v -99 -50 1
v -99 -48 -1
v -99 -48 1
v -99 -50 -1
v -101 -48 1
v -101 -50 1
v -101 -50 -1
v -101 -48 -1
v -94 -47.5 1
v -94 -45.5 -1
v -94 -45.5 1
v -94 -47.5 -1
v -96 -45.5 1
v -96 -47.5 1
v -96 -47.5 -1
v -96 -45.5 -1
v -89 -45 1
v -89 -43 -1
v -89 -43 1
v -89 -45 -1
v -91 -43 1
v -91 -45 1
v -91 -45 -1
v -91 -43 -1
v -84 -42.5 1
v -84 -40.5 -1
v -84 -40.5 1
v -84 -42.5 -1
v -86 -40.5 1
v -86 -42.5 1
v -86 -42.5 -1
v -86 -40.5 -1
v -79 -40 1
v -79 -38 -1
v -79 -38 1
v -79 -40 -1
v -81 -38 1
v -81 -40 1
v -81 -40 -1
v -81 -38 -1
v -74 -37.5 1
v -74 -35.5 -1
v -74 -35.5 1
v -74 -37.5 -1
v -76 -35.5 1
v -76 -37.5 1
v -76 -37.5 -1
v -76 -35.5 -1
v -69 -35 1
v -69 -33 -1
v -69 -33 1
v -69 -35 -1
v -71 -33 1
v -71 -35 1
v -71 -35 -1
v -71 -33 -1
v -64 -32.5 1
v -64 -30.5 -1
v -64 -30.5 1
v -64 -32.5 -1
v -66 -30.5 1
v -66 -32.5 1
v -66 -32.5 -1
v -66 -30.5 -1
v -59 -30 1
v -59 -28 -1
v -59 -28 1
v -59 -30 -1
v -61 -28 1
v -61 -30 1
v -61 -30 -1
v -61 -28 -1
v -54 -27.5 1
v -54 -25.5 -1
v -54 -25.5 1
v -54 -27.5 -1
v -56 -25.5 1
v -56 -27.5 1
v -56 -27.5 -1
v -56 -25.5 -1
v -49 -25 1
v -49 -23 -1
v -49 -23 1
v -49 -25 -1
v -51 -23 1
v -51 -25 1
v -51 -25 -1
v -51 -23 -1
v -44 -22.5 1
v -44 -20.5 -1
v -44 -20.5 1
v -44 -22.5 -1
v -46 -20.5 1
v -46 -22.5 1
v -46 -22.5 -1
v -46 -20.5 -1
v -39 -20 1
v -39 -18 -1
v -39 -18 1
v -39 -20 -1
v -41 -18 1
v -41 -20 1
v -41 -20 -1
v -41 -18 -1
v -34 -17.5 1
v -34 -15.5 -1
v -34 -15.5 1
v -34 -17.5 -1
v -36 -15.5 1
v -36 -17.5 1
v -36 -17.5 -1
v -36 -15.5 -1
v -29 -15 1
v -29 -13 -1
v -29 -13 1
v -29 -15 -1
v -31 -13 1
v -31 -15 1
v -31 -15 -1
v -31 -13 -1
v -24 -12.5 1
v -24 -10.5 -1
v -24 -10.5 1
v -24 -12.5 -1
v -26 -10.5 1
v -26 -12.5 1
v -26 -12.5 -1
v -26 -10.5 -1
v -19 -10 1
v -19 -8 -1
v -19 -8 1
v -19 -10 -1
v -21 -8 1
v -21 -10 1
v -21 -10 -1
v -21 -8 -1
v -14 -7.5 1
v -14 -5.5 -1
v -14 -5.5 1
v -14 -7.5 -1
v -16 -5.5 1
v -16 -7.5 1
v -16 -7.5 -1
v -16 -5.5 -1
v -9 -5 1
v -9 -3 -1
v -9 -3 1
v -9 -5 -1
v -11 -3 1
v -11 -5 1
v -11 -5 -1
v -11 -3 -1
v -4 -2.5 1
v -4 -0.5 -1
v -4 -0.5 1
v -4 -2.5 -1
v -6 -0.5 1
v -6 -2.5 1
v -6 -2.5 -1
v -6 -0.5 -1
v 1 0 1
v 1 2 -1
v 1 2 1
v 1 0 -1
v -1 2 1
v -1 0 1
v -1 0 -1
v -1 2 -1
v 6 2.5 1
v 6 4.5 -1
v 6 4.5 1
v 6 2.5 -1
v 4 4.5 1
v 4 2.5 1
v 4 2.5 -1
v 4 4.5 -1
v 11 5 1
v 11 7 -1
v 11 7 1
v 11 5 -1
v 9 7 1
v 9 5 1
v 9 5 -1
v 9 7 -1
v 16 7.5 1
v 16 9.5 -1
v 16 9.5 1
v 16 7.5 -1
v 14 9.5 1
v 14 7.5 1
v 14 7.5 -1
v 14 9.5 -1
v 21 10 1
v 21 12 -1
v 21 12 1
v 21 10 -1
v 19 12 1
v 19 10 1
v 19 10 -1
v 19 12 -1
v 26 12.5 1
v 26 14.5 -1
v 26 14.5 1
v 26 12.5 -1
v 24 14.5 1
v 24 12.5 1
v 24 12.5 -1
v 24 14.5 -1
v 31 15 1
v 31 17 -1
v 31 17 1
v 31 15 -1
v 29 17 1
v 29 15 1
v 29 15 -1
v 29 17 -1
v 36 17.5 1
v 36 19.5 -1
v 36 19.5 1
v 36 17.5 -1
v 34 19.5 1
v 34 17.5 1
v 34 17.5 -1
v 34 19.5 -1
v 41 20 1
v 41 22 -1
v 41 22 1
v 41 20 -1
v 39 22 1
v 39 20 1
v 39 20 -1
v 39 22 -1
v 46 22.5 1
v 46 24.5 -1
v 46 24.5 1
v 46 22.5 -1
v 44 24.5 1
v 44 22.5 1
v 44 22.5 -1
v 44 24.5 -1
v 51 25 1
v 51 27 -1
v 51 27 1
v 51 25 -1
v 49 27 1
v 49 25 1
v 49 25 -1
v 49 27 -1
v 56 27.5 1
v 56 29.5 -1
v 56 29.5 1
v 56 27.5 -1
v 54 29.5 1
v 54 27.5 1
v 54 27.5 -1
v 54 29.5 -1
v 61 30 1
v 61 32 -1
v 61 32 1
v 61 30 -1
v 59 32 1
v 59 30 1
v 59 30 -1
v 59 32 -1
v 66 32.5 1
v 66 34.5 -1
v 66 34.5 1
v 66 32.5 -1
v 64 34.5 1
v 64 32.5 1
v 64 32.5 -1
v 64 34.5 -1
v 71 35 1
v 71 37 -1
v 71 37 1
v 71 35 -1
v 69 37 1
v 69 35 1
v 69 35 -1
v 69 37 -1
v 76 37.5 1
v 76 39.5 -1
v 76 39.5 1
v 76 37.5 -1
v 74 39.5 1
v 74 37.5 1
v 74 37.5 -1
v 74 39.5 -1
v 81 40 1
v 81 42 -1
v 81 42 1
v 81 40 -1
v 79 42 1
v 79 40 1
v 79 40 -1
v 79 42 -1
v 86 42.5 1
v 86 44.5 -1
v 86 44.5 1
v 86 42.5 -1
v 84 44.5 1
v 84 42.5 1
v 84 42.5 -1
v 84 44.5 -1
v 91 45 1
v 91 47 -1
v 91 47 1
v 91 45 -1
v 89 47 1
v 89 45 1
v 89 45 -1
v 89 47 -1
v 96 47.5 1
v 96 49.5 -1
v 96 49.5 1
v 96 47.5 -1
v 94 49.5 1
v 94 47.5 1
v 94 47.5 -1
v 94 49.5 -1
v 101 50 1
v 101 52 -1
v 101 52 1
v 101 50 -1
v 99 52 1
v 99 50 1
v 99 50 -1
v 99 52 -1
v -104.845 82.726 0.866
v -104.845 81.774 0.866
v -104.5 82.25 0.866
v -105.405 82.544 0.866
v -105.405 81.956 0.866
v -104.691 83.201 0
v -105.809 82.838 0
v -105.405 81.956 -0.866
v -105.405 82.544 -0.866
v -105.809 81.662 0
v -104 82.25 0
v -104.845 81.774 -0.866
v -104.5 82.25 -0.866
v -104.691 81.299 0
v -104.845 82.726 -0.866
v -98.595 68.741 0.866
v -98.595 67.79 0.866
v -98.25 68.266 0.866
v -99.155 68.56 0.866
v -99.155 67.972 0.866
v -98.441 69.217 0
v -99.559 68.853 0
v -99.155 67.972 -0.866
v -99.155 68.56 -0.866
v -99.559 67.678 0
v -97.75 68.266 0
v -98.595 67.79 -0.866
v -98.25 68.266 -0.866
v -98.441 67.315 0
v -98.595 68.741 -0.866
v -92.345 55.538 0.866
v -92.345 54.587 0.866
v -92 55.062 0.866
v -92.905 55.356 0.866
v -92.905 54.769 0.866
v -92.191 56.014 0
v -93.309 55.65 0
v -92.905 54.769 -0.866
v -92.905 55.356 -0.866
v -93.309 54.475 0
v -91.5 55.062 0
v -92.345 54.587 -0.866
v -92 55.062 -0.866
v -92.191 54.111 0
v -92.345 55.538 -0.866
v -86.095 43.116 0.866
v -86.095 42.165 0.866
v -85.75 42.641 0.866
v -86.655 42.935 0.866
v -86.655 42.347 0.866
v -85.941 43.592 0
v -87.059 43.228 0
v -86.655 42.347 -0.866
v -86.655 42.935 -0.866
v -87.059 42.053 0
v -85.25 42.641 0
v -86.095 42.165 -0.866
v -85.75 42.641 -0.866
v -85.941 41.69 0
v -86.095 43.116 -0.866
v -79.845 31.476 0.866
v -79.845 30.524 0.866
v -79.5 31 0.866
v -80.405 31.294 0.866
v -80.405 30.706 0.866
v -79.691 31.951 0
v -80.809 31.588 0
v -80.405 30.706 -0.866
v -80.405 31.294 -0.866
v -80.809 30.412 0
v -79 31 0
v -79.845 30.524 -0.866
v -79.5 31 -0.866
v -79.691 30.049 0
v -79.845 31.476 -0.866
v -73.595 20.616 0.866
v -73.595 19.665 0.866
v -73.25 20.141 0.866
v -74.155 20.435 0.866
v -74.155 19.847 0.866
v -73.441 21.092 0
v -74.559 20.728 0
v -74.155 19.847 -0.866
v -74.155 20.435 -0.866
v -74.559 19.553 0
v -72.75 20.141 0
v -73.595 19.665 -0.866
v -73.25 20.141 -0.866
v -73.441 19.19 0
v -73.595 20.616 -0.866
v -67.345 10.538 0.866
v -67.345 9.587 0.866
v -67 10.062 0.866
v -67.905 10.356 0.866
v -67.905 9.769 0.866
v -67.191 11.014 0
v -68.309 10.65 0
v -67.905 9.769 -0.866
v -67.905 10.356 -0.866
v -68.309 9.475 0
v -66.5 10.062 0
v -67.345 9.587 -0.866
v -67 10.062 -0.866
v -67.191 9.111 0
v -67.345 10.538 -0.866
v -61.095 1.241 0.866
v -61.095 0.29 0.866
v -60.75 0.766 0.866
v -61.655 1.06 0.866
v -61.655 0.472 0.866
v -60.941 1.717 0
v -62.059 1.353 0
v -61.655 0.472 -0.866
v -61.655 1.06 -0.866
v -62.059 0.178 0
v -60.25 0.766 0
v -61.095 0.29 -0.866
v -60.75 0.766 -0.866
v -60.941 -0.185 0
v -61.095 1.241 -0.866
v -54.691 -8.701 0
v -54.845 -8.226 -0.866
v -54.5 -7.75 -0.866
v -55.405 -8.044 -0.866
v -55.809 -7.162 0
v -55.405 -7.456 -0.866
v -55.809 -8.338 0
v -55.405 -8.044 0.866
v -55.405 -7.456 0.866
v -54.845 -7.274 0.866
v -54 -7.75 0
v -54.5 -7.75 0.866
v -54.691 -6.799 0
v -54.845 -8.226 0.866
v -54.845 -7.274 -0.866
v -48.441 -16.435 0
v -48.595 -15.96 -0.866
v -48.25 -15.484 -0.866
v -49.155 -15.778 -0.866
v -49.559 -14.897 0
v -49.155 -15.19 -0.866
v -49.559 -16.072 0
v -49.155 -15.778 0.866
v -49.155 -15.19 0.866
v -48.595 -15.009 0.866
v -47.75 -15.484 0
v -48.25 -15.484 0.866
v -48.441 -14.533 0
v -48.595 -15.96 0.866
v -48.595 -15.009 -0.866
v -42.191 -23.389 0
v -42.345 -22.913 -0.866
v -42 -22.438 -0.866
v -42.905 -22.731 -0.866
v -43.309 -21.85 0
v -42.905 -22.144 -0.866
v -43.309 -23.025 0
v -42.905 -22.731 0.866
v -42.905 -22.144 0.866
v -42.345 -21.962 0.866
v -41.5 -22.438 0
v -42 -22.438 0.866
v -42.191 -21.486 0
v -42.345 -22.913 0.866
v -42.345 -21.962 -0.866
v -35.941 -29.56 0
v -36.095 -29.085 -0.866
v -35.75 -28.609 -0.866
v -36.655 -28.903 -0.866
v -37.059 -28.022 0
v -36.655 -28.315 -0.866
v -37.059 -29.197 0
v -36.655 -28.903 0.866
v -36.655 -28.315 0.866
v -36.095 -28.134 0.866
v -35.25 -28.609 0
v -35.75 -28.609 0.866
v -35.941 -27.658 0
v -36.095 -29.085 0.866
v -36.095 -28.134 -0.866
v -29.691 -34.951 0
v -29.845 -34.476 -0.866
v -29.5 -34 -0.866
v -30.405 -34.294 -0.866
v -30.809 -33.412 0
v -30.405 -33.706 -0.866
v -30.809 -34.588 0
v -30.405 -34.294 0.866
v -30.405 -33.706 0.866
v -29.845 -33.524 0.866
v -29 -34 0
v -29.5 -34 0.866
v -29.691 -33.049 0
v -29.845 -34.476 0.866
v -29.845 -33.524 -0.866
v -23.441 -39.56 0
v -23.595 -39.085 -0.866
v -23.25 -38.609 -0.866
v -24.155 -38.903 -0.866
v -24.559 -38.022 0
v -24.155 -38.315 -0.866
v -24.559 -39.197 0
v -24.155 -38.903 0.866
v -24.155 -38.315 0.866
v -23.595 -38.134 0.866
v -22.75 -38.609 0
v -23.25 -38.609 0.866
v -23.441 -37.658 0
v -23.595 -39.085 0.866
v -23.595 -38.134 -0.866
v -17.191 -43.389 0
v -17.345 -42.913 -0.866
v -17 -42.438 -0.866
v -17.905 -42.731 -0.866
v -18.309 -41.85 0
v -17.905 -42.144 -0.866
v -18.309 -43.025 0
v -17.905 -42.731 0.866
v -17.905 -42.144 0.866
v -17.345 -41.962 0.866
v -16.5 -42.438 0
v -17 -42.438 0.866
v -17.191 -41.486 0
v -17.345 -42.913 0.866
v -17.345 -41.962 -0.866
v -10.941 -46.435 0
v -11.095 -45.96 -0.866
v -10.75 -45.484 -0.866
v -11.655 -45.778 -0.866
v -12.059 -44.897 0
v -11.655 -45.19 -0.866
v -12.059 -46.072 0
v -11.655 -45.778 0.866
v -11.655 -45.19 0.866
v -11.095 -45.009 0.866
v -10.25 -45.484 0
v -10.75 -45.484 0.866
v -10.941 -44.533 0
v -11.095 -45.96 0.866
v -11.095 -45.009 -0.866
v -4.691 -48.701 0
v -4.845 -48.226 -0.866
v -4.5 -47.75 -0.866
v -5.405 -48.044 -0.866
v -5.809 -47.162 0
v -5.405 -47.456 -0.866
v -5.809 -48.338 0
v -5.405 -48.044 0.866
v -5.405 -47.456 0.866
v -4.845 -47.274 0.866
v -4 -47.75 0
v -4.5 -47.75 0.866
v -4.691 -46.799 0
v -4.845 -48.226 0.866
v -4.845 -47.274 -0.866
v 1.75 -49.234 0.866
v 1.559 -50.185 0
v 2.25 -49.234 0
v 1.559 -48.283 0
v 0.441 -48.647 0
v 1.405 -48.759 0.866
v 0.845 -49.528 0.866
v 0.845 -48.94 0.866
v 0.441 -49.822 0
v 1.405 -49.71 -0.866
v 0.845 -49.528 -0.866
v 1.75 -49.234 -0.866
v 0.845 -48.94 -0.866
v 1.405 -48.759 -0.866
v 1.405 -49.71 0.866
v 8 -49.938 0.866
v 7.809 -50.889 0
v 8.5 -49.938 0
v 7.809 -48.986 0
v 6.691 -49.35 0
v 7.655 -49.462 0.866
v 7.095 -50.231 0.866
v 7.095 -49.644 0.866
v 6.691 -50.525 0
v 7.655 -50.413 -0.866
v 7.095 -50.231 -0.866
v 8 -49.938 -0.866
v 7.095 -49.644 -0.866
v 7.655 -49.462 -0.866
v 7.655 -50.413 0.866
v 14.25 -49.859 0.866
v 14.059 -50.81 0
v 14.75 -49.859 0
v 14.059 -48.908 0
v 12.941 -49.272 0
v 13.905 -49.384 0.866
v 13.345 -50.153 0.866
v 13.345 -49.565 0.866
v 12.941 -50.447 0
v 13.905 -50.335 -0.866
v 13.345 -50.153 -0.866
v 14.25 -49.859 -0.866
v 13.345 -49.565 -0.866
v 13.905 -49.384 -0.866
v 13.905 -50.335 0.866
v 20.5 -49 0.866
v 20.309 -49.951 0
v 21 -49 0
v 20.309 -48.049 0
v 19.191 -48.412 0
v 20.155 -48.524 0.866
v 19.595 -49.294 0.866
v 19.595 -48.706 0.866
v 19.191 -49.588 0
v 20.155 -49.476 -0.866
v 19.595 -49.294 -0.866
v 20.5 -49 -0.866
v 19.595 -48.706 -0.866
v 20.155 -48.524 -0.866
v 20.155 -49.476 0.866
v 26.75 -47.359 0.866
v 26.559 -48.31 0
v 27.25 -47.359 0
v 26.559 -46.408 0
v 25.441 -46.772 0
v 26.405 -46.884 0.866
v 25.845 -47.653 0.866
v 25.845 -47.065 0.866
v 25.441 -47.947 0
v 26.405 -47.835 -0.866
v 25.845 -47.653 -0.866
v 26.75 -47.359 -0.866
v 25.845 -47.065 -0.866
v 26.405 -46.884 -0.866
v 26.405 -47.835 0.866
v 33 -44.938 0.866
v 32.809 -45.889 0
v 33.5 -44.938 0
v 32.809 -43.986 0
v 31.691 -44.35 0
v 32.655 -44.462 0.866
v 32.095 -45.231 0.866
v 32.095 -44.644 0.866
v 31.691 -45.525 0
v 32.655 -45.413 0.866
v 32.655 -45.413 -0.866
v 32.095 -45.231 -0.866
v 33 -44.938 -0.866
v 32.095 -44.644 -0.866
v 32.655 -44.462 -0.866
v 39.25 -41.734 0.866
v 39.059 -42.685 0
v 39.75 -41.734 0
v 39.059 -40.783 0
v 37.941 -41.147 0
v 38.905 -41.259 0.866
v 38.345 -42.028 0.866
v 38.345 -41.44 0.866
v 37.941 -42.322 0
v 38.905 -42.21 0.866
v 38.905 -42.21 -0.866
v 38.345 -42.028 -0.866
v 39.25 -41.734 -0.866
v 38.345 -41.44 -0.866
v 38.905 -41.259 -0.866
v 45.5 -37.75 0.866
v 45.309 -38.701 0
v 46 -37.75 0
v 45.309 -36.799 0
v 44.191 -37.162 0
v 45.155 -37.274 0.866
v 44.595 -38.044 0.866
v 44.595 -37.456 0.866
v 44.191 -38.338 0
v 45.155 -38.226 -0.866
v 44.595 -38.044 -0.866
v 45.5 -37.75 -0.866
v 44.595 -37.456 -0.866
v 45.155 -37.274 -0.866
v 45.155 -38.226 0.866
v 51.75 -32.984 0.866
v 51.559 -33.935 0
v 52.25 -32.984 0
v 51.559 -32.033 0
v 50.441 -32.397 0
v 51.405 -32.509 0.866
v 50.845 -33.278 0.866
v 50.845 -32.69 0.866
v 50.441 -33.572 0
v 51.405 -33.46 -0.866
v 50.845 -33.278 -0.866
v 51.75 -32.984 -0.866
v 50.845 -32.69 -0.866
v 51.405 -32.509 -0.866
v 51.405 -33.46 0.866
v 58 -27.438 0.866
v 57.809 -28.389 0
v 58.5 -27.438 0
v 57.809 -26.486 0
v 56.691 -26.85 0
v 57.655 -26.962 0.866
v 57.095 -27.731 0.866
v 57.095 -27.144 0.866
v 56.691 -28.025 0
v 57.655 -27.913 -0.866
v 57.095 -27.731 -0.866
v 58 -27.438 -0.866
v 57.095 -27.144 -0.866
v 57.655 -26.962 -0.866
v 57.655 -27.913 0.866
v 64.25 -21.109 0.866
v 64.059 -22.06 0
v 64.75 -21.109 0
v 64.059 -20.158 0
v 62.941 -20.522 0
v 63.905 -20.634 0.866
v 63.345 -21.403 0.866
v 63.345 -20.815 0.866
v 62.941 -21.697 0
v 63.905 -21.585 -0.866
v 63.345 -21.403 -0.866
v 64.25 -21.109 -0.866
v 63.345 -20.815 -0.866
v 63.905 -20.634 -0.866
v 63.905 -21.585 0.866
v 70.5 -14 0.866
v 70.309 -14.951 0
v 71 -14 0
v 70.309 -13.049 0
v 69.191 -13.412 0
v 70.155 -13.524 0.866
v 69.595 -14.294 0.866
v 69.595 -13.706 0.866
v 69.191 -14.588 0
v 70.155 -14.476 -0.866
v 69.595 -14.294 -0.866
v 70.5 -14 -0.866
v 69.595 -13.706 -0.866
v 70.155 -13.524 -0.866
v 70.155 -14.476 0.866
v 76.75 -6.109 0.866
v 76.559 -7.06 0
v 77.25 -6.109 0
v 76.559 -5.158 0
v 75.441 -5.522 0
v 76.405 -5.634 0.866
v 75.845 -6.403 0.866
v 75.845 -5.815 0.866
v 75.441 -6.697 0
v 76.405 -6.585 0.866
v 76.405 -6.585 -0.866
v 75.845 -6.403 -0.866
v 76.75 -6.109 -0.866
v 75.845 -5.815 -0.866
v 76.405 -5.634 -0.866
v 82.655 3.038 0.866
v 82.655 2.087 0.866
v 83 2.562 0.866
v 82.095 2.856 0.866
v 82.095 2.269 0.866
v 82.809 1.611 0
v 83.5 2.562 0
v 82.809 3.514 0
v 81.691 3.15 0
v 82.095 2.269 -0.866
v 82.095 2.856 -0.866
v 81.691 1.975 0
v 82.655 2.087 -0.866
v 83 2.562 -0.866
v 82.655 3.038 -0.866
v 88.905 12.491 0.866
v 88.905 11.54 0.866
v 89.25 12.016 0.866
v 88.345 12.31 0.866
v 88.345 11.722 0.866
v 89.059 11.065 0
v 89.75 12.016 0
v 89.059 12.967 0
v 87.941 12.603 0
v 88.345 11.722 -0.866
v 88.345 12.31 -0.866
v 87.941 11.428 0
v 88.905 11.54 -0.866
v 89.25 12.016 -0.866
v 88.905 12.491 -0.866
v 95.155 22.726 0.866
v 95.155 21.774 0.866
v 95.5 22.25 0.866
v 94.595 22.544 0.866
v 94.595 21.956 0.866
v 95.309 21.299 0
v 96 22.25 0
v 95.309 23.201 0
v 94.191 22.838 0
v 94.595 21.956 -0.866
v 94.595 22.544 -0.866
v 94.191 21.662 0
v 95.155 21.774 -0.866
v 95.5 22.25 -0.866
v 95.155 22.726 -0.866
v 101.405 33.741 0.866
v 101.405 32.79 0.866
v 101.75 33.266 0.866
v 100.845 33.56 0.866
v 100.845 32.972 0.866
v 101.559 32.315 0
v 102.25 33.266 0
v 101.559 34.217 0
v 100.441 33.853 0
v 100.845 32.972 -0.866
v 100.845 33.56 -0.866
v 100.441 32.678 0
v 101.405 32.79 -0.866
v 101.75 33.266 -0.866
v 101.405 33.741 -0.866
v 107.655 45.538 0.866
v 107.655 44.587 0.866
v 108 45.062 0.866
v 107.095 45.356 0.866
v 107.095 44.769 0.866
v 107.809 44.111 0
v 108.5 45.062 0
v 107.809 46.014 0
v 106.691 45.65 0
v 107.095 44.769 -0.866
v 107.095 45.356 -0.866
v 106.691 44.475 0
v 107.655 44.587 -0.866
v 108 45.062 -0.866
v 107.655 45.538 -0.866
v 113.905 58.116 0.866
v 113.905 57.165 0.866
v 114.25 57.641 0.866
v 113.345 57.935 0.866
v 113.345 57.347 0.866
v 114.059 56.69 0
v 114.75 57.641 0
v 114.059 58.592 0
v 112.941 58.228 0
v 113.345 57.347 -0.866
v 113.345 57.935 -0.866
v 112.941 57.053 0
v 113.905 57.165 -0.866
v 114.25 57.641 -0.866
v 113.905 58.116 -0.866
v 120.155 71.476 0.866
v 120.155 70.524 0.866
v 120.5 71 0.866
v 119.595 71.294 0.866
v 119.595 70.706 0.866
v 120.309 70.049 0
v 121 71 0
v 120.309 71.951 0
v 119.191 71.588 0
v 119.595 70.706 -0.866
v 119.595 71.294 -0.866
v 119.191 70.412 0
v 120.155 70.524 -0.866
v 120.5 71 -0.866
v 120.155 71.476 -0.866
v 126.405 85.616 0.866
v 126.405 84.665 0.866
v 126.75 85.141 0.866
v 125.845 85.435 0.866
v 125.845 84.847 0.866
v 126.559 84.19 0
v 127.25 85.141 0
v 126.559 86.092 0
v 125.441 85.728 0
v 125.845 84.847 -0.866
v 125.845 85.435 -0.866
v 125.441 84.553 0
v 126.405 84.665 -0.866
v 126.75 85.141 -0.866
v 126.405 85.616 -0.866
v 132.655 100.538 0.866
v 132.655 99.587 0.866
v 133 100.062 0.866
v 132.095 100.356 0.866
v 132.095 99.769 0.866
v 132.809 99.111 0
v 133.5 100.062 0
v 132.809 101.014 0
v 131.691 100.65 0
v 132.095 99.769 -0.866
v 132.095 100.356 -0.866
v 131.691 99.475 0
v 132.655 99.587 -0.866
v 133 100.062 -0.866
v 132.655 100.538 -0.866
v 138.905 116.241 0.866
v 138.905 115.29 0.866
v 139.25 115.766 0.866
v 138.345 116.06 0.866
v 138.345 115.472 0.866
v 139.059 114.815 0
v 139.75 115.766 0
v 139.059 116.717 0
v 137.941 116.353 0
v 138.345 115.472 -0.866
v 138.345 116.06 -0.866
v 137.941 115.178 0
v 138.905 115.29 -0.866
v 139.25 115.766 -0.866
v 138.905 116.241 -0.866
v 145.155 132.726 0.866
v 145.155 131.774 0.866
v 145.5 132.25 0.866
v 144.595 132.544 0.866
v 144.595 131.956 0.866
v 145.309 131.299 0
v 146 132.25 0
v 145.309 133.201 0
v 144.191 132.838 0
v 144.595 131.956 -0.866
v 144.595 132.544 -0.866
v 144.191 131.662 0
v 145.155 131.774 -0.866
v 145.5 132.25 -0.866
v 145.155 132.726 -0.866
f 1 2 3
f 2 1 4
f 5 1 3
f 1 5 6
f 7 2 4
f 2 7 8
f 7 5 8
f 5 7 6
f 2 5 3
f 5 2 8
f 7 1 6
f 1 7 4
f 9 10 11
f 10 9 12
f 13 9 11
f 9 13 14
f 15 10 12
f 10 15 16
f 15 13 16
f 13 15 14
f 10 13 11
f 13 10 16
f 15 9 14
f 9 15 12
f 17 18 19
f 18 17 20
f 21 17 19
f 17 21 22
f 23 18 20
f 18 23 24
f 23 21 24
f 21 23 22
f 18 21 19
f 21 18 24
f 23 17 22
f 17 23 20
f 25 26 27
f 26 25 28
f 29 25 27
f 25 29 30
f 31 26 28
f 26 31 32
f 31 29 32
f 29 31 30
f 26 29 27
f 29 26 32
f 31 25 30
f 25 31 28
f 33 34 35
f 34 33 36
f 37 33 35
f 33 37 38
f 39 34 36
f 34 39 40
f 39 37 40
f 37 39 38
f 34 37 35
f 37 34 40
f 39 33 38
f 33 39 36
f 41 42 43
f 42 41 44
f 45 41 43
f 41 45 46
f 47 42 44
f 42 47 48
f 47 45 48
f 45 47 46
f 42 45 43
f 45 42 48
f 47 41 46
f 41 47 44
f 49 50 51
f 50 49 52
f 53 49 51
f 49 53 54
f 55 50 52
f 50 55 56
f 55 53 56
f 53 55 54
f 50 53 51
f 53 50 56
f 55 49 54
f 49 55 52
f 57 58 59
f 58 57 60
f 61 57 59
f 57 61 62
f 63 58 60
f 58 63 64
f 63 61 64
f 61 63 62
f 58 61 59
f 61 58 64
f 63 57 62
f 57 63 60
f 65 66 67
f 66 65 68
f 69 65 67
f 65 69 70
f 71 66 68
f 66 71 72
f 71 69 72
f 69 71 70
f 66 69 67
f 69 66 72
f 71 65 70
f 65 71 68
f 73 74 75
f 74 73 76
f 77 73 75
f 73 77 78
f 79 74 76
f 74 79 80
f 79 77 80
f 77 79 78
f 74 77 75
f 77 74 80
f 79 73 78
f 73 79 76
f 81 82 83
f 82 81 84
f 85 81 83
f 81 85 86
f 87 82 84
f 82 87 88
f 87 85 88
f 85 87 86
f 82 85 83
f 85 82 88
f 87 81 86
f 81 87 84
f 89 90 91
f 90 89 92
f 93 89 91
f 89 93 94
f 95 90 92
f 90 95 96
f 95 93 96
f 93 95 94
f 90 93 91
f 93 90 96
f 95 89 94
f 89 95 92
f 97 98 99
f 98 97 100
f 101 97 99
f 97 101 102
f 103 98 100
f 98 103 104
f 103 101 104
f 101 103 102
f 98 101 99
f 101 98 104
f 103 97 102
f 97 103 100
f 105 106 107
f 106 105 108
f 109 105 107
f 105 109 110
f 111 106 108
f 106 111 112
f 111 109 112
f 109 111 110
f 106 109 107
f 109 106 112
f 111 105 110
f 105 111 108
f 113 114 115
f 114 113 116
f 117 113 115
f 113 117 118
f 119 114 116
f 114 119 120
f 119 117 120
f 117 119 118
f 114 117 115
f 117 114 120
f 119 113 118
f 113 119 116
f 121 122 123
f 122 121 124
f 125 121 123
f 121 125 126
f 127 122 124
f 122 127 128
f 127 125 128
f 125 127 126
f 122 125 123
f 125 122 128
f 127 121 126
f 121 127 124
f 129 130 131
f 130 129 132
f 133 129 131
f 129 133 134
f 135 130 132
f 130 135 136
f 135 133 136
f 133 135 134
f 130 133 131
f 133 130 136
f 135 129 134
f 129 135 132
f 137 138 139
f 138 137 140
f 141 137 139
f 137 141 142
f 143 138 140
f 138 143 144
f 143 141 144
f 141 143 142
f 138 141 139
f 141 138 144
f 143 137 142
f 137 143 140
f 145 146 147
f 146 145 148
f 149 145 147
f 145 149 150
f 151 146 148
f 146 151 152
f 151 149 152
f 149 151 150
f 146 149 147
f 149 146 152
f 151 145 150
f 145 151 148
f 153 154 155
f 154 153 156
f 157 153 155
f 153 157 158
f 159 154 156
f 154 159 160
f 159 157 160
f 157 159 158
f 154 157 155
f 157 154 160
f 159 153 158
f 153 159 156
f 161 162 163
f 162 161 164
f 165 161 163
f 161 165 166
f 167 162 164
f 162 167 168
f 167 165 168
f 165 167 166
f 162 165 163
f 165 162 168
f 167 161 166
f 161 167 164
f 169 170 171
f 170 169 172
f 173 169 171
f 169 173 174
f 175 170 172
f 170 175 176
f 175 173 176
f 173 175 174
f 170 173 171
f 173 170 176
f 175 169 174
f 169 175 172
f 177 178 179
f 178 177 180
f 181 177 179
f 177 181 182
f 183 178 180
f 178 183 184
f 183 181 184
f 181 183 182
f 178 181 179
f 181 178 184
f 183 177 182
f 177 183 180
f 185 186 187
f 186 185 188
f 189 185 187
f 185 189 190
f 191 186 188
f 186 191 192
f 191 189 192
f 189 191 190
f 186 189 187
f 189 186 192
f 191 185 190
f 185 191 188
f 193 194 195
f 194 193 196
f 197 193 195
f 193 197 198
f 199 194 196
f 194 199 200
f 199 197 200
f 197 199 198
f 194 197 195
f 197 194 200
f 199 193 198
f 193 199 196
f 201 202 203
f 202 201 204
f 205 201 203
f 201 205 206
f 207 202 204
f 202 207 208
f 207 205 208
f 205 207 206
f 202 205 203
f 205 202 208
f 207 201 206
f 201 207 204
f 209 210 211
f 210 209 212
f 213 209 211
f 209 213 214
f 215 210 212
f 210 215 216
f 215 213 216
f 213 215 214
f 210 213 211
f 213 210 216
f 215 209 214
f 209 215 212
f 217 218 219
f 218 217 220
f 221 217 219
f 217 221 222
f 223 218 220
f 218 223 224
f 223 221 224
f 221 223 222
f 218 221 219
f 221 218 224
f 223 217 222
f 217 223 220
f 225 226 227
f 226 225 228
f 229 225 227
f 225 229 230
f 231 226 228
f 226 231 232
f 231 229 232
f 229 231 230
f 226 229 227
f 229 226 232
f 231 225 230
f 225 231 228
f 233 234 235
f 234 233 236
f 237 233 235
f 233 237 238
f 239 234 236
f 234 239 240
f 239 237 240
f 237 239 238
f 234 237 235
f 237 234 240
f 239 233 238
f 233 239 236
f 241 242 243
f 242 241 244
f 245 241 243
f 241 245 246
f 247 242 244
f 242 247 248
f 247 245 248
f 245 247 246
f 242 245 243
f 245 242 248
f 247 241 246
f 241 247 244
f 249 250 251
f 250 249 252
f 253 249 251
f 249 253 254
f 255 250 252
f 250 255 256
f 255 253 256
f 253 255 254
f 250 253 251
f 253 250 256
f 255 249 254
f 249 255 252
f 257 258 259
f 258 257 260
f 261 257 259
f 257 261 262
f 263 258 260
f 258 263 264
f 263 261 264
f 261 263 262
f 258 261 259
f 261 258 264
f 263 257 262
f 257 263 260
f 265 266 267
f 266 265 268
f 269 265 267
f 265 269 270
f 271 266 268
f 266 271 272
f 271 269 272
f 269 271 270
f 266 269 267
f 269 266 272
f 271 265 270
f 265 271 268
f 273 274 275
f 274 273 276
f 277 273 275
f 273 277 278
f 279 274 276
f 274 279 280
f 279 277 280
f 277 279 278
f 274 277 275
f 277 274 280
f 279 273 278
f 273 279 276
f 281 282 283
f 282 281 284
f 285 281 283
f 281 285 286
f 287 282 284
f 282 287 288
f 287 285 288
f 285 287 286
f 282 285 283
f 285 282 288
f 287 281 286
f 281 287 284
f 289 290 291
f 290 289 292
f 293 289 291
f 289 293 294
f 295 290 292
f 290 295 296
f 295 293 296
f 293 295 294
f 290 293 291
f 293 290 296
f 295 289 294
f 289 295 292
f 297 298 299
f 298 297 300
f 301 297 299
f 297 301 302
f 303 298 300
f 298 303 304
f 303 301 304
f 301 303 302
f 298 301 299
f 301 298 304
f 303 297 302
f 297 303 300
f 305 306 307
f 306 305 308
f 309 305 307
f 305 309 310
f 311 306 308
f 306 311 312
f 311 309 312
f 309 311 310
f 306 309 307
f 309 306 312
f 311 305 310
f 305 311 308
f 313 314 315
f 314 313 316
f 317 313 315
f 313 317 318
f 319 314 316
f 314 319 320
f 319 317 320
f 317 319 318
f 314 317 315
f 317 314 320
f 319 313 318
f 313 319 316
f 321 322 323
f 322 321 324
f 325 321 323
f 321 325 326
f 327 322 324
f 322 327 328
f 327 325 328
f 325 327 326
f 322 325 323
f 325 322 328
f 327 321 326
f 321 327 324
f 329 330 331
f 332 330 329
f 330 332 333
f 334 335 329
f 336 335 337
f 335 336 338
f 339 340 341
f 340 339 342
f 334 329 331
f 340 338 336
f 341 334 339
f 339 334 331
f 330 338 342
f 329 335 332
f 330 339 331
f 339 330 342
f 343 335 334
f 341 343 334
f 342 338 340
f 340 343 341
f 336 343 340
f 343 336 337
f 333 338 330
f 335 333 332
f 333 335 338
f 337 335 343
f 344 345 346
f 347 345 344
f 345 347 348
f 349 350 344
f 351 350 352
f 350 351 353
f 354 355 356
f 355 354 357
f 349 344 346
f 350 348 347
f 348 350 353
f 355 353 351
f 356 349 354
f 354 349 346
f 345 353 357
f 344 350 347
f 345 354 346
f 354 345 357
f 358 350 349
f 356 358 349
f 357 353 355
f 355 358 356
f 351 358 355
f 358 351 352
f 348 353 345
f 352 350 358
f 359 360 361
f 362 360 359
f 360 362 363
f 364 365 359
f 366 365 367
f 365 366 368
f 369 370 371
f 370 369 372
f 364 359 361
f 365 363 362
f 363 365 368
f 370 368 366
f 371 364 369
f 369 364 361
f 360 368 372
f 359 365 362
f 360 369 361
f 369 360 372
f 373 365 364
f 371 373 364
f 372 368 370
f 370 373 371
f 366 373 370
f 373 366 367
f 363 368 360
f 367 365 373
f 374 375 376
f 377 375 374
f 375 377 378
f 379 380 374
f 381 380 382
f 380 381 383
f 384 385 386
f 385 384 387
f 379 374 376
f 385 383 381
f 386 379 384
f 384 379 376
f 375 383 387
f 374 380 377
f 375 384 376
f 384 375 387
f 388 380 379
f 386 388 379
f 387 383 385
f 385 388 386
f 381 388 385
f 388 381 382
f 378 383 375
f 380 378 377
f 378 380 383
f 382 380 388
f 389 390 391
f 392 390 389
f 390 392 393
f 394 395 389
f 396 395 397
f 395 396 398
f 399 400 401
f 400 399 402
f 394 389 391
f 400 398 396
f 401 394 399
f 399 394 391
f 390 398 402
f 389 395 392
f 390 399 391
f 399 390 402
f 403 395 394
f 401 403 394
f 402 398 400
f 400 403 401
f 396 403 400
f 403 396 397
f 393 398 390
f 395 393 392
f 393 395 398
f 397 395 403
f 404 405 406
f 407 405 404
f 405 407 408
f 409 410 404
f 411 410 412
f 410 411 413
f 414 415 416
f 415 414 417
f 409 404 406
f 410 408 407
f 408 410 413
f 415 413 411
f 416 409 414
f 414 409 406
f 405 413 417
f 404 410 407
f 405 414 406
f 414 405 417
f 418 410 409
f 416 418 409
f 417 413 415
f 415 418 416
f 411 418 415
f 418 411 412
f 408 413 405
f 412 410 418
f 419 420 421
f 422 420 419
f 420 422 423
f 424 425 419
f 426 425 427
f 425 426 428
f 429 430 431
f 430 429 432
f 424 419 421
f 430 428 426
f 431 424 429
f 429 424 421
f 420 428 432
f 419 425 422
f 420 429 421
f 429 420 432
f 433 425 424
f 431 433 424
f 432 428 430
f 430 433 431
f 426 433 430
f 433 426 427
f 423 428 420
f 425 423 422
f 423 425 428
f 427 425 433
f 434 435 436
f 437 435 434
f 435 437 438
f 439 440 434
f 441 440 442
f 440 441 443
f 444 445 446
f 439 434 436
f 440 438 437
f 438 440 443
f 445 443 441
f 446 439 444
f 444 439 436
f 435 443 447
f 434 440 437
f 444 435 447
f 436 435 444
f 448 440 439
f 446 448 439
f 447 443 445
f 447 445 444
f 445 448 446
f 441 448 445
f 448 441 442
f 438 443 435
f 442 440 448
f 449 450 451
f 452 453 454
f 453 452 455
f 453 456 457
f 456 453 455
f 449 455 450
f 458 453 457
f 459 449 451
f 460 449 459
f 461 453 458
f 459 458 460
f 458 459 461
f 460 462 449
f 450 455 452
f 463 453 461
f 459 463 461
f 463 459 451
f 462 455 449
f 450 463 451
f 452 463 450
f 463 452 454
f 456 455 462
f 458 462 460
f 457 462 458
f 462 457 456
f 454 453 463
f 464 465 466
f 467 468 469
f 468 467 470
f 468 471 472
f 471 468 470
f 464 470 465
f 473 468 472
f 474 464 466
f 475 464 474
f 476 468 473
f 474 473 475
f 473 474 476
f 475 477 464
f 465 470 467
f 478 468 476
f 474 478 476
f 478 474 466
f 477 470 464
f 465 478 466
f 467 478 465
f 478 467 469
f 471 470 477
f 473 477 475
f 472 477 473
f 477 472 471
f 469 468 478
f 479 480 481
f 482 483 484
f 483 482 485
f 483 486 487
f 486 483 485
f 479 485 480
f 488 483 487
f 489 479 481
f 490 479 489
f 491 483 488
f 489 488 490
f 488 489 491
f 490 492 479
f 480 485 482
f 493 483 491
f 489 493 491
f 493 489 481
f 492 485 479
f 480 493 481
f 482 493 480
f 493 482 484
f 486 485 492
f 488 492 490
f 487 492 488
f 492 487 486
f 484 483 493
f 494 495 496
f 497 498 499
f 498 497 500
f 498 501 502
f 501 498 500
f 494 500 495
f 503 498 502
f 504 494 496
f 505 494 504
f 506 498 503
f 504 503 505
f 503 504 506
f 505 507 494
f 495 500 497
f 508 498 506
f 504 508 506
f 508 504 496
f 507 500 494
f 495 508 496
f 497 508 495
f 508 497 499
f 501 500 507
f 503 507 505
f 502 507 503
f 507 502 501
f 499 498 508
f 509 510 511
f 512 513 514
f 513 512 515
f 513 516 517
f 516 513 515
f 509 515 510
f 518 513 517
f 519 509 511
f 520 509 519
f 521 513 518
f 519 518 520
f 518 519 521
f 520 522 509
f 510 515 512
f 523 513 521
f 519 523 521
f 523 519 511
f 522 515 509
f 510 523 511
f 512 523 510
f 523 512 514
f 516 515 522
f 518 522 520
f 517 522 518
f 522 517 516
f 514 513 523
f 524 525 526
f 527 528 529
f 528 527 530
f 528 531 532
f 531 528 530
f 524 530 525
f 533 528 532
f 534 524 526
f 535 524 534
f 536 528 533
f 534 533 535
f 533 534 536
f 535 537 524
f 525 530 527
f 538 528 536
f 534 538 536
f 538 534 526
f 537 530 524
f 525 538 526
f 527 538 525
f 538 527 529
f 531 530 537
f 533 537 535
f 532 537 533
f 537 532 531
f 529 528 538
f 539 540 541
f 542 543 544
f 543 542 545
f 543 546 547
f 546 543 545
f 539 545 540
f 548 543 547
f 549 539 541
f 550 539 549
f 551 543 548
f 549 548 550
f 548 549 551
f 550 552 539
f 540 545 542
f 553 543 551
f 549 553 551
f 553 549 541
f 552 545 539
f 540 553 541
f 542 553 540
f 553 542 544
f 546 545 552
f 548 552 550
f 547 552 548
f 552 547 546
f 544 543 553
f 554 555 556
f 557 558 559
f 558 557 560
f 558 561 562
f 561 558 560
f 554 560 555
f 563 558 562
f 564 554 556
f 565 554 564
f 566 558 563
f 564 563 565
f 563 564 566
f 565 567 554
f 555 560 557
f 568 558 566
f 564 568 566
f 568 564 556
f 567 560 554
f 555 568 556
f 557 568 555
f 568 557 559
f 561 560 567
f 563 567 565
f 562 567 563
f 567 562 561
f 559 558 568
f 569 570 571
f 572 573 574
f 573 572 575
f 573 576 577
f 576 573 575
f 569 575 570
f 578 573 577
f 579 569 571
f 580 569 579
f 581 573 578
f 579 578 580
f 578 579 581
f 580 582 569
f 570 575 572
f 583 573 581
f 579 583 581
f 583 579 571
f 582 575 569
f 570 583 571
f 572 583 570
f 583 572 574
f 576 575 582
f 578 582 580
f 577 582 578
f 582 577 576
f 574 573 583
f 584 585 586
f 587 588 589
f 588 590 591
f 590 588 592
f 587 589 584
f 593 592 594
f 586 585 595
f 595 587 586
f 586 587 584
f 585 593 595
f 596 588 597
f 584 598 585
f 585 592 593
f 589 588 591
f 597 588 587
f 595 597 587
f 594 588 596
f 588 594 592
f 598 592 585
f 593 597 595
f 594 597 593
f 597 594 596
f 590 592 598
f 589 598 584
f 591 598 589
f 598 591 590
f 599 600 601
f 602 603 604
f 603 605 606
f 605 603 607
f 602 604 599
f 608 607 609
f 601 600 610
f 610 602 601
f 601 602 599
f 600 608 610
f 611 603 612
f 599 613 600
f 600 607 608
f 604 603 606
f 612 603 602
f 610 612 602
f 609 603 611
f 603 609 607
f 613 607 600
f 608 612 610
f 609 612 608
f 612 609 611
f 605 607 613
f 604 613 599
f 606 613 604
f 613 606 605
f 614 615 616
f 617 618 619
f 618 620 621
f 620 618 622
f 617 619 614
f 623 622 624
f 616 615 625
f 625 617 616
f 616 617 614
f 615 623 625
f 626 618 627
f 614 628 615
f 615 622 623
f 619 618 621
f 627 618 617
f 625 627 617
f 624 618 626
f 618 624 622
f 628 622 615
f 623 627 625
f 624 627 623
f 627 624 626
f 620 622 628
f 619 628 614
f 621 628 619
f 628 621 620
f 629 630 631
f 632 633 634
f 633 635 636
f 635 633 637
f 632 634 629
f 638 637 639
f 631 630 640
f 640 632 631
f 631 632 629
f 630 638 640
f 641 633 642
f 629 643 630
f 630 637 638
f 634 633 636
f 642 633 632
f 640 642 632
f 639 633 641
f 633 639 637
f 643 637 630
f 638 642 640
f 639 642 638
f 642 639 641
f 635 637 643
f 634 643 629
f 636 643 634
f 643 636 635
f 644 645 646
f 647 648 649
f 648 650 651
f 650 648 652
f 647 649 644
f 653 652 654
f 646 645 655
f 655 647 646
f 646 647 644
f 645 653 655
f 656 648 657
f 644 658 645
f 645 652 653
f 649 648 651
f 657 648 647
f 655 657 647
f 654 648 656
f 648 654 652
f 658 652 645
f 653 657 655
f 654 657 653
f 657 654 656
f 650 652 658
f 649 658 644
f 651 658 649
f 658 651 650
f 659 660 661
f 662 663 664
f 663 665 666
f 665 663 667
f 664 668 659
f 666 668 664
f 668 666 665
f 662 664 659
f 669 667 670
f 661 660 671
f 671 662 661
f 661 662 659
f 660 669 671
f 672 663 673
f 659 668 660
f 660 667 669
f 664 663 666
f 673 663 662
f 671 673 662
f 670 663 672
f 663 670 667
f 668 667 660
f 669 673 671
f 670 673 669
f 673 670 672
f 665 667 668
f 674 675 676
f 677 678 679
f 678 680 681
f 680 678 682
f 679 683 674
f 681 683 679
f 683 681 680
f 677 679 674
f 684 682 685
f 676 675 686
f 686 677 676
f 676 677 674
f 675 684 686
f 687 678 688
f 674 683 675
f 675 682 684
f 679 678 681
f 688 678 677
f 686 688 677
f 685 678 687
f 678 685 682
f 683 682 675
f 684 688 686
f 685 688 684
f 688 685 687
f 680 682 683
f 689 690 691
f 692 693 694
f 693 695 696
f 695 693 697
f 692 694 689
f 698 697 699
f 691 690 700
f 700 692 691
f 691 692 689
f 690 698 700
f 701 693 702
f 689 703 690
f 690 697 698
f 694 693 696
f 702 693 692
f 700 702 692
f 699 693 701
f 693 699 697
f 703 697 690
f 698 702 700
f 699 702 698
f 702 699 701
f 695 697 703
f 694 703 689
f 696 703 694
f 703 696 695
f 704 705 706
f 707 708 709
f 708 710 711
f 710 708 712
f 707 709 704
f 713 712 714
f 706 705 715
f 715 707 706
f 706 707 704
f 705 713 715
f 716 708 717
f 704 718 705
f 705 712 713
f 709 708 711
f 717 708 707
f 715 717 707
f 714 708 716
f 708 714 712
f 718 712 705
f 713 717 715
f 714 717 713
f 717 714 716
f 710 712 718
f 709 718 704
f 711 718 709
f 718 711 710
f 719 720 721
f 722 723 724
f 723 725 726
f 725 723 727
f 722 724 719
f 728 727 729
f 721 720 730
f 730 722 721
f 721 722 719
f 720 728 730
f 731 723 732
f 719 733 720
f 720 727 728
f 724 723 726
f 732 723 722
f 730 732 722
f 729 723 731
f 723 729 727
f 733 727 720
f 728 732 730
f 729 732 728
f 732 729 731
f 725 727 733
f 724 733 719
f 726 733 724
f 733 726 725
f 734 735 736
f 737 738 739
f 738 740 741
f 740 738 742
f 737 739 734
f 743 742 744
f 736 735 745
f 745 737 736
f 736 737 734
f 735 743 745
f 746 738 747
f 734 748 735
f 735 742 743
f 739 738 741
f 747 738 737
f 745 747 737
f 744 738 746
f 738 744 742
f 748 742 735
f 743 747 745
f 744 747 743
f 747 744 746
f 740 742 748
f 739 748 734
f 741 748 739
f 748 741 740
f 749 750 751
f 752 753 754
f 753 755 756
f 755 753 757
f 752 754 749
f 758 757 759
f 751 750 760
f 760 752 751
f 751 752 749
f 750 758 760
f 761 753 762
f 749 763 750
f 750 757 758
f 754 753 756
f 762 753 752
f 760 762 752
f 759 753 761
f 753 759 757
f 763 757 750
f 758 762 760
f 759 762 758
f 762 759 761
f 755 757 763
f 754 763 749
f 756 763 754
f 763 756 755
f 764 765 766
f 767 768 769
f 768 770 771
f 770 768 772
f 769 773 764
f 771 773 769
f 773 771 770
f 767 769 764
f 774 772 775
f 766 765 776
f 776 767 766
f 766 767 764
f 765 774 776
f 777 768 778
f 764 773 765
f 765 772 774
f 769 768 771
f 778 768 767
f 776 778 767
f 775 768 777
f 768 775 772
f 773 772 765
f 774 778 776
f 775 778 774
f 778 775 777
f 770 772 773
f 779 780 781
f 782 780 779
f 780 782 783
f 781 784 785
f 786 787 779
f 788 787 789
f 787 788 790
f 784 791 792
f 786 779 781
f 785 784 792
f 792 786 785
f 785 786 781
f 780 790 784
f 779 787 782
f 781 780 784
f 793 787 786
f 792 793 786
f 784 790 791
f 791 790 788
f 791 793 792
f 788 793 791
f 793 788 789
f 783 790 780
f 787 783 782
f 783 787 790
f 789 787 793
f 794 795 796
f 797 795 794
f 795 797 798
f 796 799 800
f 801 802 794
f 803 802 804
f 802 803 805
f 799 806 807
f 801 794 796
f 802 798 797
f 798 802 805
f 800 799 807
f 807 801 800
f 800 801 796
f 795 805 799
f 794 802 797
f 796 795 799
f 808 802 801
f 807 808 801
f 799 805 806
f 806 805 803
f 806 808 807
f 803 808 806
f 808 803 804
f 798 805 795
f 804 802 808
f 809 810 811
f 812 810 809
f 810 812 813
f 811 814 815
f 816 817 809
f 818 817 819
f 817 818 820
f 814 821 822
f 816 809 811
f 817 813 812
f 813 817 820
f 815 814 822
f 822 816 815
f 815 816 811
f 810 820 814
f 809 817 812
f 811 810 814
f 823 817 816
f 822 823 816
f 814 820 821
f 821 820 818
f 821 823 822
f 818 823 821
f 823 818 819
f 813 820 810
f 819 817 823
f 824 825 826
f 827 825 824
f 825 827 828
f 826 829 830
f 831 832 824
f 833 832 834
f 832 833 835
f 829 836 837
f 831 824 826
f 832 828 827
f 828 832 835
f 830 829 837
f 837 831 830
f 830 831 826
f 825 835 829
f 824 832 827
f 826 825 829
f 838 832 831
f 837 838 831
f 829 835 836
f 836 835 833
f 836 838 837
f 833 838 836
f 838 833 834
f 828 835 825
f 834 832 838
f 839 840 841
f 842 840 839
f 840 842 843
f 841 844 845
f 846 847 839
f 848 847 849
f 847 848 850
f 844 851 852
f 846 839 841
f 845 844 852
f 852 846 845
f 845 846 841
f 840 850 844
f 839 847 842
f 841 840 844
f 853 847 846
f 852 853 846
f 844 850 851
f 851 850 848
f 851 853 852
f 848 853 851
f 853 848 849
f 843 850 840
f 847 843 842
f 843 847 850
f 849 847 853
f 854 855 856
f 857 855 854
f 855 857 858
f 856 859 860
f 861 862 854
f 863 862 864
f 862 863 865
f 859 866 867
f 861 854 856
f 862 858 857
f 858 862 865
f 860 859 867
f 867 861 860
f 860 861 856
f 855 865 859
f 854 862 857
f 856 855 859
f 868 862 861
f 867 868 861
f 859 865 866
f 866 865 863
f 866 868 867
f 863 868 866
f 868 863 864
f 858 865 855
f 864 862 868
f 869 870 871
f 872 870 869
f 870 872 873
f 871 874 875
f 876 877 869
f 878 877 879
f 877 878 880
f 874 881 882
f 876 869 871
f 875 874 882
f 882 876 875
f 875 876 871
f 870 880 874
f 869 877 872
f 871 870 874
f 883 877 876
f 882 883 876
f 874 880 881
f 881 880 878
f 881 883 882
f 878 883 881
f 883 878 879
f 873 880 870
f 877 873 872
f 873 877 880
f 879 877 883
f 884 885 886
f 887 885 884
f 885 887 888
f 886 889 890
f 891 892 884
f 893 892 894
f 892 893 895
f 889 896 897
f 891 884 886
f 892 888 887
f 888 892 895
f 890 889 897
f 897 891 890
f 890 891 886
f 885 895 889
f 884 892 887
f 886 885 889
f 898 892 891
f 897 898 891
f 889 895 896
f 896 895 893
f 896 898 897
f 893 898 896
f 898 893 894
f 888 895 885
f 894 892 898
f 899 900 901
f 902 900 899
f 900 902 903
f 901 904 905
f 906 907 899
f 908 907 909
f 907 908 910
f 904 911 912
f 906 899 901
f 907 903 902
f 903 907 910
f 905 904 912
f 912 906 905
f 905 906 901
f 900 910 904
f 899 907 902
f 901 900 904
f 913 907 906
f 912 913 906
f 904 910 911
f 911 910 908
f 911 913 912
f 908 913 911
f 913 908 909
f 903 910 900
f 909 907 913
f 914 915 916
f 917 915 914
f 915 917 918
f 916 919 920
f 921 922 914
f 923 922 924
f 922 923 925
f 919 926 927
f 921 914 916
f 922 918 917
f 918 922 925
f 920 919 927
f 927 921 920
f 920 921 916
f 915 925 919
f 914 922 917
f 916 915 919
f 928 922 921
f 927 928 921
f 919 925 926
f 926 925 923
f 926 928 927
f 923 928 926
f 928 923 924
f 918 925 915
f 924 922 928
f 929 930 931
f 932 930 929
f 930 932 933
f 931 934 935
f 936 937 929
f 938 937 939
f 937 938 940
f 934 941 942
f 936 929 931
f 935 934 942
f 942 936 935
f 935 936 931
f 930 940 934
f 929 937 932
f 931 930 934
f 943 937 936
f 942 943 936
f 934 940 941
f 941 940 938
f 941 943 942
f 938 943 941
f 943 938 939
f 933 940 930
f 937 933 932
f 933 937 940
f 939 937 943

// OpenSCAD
echo(version=version());

// Functions can be defined to simplify code using lots of
// calculations.

// Simple example with a single function argument (which should
// be a number) and returning a number calculated based on that.
function f(x) = 0.5 * x + 1;

color("red")
    for (a = [ -100 : 5 : 100 ])
        translate([a, f(a), 0]) cube(2, center = true);

// Functions can call other functions and return complex values
// too. In this case a 3 element vector is returned which can
// be used as point in 3D space or as vector (in the mathematical
// meaning) for translations and other transformations.
function g(x) = [ 5 * x + 20, f(x) * f(x) - 50, 0 ];

color("green")
    for (a = [ -200 : 10 : 200 ])
        translate(g(a / 8)) sphere(1);



// Written in 2015 by Torsten Paul &ltTorsten.Paul@gmx.de>
//
// To the extent possible under law, the author(s) have dedicated all
// copyright and related and neighboring rights to this software to the
// public domain worldwide. This software is distributed without any
// warranty.
//
// You should have received a copy of the CC0 Public Domain
// Dedication along with this software.
// If not, see &lthttp://creativecommons.org/publicdomain/zero/1.0/&gt.
